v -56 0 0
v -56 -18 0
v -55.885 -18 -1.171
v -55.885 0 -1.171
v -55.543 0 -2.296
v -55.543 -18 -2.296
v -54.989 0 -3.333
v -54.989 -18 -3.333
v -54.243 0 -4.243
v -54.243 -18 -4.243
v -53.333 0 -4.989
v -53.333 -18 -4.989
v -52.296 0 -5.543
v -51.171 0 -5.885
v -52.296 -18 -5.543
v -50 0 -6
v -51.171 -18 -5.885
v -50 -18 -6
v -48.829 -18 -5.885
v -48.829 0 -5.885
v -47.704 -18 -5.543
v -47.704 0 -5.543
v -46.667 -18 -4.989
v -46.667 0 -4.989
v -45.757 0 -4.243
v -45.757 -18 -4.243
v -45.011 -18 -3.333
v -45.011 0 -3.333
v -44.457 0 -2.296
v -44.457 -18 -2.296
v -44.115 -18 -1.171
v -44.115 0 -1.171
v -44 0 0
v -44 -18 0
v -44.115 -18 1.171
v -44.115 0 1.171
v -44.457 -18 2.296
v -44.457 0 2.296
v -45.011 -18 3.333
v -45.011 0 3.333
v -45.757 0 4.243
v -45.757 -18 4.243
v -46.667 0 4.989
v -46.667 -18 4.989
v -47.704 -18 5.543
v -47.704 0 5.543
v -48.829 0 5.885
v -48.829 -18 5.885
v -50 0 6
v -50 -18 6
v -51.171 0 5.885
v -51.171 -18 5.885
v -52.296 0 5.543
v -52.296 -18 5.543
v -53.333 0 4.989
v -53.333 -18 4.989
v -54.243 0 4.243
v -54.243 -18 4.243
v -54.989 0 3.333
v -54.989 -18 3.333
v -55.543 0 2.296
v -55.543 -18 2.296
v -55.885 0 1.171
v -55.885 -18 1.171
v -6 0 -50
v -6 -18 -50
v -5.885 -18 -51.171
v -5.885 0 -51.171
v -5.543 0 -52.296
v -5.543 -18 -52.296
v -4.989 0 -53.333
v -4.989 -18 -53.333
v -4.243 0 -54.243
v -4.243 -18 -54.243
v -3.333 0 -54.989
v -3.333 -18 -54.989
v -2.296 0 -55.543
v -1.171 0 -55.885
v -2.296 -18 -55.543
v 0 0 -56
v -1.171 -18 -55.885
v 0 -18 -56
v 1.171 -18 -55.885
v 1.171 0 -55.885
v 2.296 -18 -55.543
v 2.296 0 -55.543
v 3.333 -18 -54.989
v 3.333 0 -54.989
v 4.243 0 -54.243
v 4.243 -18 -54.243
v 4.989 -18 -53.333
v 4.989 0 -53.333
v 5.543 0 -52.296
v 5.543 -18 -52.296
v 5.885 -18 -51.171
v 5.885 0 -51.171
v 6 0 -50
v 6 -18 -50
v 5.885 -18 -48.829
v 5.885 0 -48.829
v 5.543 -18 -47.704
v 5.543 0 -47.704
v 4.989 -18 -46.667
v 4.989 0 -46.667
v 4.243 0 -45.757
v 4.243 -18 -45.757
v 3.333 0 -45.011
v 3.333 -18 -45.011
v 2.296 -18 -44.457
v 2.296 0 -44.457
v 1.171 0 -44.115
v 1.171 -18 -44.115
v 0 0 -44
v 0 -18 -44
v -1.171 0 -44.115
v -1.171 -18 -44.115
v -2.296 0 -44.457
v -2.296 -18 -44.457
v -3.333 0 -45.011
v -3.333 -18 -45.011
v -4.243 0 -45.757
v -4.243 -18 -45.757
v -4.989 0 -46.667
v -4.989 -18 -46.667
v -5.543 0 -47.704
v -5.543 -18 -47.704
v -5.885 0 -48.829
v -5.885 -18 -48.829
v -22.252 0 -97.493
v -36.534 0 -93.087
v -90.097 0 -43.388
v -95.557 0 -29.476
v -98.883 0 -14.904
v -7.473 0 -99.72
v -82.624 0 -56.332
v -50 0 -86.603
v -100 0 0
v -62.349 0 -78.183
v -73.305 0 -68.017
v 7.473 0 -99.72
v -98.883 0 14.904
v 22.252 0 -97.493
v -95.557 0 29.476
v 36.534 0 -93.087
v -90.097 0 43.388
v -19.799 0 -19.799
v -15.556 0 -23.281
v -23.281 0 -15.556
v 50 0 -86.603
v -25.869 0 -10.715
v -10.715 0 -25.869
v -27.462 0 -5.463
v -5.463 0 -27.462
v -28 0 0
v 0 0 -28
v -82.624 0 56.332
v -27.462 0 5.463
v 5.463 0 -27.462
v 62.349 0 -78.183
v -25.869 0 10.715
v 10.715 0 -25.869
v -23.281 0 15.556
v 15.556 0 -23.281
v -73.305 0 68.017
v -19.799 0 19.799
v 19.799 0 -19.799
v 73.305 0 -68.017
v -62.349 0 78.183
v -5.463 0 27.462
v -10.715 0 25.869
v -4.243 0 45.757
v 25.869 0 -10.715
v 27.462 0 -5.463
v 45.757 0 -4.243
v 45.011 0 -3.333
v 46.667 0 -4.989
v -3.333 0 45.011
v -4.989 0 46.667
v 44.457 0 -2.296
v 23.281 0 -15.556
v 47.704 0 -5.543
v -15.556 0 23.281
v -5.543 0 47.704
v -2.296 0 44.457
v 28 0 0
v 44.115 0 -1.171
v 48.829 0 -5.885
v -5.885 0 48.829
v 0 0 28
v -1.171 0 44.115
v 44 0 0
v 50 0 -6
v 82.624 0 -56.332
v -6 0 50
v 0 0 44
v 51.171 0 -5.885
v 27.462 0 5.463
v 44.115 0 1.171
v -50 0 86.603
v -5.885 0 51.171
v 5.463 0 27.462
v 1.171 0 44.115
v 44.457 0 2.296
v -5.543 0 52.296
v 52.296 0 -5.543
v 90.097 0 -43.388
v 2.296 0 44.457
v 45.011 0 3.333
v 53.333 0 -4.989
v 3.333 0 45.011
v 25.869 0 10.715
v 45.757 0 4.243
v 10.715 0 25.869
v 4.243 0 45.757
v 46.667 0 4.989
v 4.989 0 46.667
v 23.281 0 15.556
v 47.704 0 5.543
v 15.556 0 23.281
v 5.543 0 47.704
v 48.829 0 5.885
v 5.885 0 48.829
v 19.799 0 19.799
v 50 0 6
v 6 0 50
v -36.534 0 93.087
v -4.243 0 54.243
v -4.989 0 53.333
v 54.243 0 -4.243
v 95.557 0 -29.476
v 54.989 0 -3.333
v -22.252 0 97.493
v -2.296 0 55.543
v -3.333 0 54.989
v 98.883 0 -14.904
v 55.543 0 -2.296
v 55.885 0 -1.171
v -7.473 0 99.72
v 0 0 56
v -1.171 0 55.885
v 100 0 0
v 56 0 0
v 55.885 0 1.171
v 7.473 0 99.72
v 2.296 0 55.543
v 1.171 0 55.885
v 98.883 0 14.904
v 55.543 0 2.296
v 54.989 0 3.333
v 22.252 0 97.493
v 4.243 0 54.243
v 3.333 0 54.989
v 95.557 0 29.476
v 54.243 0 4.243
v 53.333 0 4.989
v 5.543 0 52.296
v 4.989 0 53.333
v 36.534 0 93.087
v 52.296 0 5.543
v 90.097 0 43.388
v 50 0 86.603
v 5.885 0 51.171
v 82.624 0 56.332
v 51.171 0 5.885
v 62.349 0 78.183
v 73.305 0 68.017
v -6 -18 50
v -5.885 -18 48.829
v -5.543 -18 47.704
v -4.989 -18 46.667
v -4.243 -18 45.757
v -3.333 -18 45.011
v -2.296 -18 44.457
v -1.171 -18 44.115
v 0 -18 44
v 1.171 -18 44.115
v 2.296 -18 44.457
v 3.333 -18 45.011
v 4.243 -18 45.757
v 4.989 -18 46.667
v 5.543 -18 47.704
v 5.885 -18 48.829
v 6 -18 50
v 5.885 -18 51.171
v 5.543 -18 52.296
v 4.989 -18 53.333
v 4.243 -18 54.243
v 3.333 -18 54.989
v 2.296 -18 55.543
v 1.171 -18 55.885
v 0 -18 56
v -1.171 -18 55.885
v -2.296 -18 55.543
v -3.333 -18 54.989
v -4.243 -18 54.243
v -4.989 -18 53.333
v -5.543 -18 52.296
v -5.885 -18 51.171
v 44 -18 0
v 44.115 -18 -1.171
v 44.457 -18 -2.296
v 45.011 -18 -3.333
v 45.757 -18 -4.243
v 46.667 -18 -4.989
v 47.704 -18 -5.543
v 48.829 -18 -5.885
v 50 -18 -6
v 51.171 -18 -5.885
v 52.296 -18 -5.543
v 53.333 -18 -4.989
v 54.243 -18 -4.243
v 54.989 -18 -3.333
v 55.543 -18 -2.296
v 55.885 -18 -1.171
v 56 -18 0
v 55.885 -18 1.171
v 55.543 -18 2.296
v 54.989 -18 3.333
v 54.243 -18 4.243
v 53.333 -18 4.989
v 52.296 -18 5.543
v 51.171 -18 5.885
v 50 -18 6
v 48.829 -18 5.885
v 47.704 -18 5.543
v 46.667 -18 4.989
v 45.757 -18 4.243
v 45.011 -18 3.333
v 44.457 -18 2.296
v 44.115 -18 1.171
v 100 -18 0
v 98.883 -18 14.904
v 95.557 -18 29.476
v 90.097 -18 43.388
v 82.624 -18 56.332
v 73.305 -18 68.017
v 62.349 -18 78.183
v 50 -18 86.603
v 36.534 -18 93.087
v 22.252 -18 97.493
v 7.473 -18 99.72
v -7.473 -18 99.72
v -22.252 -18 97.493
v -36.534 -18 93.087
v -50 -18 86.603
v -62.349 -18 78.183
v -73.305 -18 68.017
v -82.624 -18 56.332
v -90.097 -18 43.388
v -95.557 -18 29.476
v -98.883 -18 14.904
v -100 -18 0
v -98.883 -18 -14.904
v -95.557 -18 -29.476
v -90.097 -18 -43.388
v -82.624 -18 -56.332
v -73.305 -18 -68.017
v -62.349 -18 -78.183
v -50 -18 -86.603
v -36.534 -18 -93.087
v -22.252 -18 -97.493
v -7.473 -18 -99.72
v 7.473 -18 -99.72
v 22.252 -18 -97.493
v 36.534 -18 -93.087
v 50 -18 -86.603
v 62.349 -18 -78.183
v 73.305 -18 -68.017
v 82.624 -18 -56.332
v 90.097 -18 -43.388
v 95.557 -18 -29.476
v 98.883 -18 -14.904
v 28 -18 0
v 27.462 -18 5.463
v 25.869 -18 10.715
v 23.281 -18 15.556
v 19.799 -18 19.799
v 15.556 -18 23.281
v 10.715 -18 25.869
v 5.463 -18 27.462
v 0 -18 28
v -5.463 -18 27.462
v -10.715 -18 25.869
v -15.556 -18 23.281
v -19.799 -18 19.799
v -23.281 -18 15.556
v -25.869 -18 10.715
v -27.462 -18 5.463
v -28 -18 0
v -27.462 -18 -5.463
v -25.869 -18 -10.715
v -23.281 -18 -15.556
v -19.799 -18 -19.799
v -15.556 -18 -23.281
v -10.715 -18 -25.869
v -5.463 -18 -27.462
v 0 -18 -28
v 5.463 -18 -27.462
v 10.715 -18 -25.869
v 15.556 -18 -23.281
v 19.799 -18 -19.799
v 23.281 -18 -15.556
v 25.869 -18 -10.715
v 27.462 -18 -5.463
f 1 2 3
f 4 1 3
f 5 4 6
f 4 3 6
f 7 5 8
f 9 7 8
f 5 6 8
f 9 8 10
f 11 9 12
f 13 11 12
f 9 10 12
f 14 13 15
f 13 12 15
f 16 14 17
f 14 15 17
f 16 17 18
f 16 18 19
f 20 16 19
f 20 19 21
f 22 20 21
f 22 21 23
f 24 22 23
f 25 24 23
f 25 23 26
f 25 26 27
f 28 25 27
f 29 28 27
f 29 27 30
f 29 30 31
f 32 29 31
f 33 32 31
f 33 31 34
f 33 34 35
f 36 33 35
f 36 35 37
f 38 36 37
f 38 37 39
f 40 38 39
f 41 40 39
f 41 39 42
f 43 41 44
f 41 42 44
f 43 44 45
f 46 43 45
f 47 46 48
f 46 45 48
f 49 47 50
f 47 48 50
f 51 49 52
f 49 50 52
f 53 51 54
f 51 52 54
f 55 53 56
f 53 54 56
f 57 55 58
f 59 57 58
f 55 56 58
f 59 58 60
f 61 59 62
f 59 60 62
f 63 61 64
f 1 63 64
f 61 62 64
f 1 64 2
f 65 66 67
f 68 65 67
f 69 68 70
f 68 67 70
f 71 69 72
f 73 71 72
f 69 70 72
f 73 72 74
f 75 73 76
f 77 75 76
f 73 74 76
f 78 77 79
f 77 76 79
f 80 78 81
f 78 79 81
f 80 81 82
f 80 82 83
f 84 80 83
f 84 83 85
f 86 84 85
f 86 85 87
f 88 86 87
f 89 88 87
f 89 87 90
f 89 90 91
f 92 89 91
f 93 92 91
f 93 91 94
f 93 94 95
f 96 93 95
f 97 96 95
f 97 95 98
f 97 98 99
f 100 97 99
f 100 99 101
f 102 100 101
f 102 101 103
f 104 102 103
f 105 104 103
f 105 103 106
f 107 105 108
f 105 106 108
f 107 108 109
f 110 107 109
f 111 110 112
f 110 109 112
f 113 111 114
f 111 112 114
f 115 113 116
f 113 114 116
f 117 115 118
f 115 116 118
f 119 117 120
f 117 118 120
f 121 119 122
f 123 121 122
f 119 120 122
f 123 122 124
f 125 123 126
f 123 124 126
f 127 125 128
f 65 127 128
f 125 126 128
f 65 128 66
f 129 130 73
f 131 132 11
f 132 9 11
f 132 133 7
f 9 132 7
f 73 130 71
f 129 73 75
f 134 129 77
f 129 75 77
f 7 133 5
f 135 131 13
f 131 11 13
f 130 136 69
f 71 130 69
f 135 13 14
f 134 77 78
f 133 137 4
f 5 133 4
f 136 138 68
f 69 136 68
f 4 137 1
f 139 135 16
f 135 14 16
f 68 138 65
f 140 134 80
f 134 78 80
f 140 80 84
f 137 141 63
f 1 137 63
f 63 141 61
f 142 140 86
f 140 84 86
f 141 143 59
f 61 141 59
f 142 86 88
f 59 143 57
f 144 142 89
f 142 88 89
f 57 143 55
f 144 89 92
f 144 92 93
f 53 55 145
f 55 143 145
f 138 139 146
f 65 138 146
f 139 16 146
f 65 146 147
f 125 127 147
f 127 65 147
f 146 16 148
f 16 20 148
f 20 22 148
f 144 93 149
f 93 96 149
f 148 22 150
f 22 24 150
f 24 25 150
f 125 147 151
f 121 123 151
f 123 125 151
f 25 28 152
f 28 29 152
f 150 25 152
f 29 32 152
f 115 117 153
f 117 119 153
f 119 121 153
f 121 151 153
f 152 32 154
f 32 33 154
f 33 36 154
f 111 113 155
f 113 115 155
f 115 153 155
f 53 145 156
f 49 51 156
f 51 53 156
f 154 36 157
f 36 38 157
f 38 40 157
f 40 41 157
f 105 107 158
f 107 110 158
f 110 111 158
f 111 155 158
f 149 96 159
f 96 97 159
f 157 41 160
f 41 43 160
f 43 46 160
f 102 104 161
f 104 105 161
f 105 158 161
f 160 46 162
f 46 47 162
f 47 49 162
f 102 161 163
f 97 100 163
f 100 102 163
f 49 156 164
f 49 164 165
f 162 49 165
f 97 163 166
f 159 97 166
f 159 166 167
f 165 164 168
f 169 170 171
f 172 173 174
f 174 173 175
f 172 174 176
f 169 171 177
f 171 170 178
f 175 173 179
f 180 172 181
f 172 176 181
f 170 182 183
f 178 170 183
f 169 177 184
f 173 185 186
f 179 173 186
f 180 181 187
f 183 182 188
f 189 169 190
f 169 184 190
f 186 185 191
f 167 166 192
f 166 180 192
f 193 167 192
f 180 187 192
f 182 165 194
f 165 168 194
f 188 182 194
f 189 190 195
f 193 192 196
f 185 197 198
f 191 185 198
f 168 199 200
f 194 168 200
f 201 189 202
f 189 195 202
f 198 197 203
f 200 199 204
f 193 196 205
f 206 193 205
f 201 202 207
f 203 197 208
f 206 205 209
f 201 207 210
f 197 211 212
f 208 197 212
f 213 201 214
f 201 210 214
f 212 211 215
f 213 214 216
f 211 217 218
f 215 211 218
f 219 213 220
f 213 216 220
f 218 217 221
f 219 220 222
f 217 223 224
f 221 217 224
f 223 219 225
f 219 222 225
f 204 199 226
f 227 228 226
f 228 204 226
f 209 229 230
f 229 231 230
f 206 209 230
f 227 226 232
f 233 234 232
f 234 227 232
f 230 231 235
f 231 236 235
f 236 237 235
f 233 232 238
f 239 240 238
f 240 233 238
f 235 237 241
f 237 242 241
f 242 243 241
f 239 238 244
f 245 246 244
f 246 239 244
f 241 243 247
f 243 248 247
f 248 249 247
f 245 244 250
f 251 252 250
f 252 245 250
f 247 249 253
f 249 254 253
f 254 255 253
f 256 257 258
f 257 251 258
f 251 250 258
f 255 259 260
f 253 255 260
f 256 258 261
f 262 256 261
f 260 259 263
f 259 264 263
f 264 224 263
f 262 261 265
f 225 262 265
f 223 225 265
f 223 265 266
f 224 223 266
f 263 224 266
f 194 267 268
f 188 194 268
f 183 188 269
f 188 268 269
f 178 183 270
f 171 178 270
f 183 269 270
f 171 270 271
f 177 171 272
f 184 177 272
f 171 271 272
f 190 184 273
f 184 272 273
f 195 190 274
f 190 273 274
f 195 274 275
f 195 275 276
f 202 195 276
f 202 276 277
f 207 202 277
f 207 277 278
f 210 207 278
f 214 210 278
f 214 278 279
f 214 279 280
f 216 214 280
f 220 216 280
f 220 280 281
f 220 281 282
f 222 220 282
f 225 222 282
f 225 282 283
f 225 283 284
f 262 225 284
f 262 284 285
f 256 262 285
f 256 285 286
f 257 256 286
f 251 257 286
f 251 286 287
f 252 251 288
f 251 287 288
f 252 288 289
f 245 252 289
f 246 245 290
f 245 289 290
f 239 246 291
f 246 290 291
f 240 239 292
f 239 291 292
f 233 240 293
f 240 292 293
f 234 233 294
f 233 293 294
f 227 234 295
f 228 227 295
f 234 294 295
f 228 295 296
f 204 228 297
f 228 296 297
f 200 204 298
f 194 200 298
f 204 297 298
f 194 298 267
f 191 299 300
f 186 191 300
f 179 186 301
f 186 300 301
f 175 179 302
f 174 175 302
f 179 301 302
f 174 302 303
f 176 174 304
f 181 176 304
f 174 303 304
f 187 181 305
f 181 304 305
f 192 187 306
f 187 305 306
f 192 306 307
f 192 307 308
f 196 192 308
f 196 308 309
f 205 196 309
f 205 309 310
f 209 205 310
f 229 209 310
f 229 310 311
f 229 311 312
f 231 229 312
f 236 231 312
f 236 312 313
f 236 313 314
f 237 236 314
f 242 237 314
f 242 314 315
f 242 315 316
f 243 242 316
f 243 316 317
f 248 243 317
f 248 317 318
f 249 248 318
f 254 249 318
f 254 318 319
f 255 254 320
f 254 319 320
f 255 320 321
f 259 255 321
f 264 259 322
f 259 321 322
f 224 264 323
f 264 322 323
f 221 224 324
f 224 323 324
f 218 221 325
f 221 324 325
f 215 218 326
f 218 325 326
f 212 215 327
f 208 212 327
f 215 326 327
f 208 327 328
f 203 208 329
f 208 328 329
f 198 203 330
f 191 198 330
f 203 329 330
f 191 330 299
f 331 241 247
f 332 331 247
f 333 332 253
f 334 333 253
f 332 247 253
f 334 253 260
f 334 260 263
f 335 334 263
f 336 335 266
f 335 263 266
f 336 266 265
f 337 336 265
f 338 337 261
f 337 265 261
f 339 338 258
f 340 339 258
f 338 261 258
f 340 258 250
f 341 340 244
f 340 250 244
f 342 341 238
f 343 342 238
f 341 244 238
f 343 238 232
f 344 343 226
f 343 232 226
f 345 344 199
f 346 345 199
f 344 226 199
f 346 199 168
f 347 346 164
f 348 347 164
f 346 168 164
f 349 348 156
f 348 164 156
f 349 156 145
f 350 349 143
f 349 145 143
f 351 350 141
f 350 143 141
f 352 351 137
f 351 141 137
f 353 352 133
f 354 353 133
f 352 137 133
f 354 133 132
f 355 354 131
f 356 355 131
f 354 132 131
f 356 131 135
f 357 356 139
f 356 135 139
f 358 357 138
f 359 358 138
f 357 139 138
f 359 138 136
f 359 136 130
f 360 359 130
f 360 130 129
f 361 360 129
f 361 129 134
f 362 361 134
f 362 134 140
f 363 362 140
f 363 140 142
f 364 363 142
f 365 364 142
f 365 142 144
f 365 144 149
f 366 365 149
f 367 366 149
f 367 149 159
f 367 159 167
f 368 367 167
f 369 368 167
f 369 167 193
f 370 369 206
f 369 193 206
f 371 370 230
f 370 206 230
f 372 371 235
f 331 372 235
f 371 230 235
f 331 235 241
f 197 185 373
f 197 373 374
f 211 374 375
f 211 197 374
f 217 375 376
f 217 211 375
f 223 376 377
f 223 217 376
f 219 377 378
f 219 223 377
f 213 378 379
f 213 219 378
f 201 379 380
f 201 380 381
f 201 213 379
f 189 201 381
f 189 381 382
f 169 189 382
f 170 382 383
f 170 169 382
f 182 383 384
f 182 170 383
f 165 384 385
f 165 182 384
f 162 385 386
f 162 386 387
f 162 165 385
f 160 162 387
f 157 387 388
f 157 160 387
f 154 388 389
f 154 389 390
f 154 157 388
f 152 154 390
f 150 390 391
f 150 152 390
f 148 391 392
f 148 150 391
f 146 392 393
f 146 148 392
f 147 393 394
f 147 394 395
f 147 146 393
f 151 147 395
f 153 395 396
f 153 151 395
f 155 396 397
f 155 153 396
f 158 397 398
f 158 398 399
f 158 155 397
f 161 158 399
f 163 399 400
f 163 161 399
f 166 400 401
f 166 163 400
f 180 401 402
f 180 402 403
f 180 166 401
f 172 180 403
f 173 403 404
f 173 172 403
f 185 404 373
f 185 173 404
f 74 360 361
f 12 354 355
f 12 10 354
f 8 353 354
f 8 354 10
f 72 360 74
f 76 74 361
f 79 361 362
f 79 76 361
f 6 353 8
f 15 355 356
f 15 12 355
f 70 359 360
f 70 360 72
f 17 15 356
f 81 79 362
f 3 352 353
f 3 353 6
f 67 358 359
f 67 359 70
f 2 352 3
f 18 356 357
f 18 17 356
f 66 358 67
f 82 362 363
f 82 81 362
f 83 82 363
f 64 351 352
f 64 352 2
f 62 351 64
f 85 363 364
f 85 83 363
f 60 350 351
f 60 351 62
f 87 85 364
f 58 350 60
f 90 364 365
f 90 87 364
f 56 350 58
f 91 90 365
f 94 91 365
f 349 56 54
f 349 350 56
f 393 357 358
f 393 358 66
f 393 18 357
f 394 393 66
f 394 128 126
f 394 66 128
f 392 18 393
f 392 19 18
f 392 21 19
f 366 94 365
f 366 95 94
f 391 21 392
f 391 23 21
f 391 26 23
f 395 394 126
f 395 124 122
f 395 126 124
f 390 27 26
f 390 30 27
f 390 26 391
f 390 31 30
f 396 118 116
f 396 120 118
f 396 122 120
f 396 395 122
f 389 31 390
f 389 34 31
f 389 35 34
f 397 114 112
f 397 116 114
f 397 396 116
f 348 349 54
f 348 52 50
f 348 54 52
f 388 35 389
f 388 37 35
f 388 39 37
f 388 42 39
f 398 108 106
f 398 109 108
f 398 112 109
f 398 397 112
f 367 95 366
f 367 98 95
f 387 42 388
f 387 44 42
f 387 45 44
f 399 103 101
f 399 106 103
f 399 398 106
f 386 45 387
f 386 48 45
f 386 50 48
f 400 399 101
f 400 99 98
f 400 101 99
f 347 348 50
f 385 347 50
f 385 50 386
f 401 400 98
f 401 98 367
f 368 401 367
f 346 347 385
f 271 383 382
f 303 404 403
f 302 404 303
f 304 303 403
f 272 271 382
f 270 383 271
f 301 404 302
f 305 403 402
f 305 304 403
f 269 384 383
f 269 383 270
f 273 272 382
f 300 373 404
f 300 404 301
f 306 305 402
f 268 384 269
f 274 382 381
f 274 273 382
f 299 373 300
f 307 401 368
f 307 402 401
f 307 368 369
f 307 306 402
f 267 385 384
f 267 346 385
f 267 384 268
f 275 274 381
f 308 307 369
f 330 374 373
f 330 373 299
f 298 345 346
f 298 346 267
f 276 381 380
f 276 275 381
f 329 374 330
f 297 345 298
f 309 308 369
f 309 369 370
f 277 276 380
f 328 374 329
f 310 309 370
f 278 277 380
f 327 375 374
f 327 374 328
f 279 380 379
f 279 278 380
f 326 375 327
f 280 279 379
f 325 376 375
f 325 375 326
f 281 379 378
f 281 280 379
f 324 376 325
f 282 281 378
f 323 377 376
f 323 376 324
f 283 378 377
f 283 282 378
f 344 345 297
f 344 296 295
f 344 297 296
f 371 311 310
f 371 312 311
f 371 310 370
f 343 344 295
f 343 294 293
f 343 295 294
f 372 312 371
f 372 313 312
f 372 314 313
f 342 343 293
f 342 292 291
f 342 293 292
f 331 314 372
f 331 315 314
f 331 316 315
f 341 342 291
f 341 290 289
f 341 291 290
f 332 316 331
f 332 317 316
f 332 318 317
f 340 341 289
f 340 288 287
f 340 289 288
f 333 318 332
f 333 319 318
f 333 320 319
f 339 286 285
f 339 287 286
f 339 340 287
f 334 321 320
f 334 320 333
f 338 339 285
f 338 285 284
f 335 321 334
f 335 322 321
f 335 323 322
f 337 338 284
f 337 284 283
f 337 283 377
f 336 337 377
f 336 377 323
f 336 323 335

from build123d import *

# Parameters (mm, degrees)
F0_R     = 100
F0_R_2   = 28
F1_DEPTH = 18
F2_D     = 12


with BuildPart() as f1:
    # F0 (on Front) → F1 (new body)
    with BuildSketch(Plane.XZ):
        Circle(F0_R)
        Circle(F0_R_2, mode=Mode.SUBTRACT)
    extrude(amount=F1_DEPTH)

    # F2 (through all)
    with Locations(Plane(origin=(0, 0, 0), x_dir=(1, 0, 0), z_dir=(0, 1, 0))):
        with Locations((0, 50), (50, 0), (0, -50), (-50, 0)):
            Hole(F2_D / 2)


solid = f1.part
